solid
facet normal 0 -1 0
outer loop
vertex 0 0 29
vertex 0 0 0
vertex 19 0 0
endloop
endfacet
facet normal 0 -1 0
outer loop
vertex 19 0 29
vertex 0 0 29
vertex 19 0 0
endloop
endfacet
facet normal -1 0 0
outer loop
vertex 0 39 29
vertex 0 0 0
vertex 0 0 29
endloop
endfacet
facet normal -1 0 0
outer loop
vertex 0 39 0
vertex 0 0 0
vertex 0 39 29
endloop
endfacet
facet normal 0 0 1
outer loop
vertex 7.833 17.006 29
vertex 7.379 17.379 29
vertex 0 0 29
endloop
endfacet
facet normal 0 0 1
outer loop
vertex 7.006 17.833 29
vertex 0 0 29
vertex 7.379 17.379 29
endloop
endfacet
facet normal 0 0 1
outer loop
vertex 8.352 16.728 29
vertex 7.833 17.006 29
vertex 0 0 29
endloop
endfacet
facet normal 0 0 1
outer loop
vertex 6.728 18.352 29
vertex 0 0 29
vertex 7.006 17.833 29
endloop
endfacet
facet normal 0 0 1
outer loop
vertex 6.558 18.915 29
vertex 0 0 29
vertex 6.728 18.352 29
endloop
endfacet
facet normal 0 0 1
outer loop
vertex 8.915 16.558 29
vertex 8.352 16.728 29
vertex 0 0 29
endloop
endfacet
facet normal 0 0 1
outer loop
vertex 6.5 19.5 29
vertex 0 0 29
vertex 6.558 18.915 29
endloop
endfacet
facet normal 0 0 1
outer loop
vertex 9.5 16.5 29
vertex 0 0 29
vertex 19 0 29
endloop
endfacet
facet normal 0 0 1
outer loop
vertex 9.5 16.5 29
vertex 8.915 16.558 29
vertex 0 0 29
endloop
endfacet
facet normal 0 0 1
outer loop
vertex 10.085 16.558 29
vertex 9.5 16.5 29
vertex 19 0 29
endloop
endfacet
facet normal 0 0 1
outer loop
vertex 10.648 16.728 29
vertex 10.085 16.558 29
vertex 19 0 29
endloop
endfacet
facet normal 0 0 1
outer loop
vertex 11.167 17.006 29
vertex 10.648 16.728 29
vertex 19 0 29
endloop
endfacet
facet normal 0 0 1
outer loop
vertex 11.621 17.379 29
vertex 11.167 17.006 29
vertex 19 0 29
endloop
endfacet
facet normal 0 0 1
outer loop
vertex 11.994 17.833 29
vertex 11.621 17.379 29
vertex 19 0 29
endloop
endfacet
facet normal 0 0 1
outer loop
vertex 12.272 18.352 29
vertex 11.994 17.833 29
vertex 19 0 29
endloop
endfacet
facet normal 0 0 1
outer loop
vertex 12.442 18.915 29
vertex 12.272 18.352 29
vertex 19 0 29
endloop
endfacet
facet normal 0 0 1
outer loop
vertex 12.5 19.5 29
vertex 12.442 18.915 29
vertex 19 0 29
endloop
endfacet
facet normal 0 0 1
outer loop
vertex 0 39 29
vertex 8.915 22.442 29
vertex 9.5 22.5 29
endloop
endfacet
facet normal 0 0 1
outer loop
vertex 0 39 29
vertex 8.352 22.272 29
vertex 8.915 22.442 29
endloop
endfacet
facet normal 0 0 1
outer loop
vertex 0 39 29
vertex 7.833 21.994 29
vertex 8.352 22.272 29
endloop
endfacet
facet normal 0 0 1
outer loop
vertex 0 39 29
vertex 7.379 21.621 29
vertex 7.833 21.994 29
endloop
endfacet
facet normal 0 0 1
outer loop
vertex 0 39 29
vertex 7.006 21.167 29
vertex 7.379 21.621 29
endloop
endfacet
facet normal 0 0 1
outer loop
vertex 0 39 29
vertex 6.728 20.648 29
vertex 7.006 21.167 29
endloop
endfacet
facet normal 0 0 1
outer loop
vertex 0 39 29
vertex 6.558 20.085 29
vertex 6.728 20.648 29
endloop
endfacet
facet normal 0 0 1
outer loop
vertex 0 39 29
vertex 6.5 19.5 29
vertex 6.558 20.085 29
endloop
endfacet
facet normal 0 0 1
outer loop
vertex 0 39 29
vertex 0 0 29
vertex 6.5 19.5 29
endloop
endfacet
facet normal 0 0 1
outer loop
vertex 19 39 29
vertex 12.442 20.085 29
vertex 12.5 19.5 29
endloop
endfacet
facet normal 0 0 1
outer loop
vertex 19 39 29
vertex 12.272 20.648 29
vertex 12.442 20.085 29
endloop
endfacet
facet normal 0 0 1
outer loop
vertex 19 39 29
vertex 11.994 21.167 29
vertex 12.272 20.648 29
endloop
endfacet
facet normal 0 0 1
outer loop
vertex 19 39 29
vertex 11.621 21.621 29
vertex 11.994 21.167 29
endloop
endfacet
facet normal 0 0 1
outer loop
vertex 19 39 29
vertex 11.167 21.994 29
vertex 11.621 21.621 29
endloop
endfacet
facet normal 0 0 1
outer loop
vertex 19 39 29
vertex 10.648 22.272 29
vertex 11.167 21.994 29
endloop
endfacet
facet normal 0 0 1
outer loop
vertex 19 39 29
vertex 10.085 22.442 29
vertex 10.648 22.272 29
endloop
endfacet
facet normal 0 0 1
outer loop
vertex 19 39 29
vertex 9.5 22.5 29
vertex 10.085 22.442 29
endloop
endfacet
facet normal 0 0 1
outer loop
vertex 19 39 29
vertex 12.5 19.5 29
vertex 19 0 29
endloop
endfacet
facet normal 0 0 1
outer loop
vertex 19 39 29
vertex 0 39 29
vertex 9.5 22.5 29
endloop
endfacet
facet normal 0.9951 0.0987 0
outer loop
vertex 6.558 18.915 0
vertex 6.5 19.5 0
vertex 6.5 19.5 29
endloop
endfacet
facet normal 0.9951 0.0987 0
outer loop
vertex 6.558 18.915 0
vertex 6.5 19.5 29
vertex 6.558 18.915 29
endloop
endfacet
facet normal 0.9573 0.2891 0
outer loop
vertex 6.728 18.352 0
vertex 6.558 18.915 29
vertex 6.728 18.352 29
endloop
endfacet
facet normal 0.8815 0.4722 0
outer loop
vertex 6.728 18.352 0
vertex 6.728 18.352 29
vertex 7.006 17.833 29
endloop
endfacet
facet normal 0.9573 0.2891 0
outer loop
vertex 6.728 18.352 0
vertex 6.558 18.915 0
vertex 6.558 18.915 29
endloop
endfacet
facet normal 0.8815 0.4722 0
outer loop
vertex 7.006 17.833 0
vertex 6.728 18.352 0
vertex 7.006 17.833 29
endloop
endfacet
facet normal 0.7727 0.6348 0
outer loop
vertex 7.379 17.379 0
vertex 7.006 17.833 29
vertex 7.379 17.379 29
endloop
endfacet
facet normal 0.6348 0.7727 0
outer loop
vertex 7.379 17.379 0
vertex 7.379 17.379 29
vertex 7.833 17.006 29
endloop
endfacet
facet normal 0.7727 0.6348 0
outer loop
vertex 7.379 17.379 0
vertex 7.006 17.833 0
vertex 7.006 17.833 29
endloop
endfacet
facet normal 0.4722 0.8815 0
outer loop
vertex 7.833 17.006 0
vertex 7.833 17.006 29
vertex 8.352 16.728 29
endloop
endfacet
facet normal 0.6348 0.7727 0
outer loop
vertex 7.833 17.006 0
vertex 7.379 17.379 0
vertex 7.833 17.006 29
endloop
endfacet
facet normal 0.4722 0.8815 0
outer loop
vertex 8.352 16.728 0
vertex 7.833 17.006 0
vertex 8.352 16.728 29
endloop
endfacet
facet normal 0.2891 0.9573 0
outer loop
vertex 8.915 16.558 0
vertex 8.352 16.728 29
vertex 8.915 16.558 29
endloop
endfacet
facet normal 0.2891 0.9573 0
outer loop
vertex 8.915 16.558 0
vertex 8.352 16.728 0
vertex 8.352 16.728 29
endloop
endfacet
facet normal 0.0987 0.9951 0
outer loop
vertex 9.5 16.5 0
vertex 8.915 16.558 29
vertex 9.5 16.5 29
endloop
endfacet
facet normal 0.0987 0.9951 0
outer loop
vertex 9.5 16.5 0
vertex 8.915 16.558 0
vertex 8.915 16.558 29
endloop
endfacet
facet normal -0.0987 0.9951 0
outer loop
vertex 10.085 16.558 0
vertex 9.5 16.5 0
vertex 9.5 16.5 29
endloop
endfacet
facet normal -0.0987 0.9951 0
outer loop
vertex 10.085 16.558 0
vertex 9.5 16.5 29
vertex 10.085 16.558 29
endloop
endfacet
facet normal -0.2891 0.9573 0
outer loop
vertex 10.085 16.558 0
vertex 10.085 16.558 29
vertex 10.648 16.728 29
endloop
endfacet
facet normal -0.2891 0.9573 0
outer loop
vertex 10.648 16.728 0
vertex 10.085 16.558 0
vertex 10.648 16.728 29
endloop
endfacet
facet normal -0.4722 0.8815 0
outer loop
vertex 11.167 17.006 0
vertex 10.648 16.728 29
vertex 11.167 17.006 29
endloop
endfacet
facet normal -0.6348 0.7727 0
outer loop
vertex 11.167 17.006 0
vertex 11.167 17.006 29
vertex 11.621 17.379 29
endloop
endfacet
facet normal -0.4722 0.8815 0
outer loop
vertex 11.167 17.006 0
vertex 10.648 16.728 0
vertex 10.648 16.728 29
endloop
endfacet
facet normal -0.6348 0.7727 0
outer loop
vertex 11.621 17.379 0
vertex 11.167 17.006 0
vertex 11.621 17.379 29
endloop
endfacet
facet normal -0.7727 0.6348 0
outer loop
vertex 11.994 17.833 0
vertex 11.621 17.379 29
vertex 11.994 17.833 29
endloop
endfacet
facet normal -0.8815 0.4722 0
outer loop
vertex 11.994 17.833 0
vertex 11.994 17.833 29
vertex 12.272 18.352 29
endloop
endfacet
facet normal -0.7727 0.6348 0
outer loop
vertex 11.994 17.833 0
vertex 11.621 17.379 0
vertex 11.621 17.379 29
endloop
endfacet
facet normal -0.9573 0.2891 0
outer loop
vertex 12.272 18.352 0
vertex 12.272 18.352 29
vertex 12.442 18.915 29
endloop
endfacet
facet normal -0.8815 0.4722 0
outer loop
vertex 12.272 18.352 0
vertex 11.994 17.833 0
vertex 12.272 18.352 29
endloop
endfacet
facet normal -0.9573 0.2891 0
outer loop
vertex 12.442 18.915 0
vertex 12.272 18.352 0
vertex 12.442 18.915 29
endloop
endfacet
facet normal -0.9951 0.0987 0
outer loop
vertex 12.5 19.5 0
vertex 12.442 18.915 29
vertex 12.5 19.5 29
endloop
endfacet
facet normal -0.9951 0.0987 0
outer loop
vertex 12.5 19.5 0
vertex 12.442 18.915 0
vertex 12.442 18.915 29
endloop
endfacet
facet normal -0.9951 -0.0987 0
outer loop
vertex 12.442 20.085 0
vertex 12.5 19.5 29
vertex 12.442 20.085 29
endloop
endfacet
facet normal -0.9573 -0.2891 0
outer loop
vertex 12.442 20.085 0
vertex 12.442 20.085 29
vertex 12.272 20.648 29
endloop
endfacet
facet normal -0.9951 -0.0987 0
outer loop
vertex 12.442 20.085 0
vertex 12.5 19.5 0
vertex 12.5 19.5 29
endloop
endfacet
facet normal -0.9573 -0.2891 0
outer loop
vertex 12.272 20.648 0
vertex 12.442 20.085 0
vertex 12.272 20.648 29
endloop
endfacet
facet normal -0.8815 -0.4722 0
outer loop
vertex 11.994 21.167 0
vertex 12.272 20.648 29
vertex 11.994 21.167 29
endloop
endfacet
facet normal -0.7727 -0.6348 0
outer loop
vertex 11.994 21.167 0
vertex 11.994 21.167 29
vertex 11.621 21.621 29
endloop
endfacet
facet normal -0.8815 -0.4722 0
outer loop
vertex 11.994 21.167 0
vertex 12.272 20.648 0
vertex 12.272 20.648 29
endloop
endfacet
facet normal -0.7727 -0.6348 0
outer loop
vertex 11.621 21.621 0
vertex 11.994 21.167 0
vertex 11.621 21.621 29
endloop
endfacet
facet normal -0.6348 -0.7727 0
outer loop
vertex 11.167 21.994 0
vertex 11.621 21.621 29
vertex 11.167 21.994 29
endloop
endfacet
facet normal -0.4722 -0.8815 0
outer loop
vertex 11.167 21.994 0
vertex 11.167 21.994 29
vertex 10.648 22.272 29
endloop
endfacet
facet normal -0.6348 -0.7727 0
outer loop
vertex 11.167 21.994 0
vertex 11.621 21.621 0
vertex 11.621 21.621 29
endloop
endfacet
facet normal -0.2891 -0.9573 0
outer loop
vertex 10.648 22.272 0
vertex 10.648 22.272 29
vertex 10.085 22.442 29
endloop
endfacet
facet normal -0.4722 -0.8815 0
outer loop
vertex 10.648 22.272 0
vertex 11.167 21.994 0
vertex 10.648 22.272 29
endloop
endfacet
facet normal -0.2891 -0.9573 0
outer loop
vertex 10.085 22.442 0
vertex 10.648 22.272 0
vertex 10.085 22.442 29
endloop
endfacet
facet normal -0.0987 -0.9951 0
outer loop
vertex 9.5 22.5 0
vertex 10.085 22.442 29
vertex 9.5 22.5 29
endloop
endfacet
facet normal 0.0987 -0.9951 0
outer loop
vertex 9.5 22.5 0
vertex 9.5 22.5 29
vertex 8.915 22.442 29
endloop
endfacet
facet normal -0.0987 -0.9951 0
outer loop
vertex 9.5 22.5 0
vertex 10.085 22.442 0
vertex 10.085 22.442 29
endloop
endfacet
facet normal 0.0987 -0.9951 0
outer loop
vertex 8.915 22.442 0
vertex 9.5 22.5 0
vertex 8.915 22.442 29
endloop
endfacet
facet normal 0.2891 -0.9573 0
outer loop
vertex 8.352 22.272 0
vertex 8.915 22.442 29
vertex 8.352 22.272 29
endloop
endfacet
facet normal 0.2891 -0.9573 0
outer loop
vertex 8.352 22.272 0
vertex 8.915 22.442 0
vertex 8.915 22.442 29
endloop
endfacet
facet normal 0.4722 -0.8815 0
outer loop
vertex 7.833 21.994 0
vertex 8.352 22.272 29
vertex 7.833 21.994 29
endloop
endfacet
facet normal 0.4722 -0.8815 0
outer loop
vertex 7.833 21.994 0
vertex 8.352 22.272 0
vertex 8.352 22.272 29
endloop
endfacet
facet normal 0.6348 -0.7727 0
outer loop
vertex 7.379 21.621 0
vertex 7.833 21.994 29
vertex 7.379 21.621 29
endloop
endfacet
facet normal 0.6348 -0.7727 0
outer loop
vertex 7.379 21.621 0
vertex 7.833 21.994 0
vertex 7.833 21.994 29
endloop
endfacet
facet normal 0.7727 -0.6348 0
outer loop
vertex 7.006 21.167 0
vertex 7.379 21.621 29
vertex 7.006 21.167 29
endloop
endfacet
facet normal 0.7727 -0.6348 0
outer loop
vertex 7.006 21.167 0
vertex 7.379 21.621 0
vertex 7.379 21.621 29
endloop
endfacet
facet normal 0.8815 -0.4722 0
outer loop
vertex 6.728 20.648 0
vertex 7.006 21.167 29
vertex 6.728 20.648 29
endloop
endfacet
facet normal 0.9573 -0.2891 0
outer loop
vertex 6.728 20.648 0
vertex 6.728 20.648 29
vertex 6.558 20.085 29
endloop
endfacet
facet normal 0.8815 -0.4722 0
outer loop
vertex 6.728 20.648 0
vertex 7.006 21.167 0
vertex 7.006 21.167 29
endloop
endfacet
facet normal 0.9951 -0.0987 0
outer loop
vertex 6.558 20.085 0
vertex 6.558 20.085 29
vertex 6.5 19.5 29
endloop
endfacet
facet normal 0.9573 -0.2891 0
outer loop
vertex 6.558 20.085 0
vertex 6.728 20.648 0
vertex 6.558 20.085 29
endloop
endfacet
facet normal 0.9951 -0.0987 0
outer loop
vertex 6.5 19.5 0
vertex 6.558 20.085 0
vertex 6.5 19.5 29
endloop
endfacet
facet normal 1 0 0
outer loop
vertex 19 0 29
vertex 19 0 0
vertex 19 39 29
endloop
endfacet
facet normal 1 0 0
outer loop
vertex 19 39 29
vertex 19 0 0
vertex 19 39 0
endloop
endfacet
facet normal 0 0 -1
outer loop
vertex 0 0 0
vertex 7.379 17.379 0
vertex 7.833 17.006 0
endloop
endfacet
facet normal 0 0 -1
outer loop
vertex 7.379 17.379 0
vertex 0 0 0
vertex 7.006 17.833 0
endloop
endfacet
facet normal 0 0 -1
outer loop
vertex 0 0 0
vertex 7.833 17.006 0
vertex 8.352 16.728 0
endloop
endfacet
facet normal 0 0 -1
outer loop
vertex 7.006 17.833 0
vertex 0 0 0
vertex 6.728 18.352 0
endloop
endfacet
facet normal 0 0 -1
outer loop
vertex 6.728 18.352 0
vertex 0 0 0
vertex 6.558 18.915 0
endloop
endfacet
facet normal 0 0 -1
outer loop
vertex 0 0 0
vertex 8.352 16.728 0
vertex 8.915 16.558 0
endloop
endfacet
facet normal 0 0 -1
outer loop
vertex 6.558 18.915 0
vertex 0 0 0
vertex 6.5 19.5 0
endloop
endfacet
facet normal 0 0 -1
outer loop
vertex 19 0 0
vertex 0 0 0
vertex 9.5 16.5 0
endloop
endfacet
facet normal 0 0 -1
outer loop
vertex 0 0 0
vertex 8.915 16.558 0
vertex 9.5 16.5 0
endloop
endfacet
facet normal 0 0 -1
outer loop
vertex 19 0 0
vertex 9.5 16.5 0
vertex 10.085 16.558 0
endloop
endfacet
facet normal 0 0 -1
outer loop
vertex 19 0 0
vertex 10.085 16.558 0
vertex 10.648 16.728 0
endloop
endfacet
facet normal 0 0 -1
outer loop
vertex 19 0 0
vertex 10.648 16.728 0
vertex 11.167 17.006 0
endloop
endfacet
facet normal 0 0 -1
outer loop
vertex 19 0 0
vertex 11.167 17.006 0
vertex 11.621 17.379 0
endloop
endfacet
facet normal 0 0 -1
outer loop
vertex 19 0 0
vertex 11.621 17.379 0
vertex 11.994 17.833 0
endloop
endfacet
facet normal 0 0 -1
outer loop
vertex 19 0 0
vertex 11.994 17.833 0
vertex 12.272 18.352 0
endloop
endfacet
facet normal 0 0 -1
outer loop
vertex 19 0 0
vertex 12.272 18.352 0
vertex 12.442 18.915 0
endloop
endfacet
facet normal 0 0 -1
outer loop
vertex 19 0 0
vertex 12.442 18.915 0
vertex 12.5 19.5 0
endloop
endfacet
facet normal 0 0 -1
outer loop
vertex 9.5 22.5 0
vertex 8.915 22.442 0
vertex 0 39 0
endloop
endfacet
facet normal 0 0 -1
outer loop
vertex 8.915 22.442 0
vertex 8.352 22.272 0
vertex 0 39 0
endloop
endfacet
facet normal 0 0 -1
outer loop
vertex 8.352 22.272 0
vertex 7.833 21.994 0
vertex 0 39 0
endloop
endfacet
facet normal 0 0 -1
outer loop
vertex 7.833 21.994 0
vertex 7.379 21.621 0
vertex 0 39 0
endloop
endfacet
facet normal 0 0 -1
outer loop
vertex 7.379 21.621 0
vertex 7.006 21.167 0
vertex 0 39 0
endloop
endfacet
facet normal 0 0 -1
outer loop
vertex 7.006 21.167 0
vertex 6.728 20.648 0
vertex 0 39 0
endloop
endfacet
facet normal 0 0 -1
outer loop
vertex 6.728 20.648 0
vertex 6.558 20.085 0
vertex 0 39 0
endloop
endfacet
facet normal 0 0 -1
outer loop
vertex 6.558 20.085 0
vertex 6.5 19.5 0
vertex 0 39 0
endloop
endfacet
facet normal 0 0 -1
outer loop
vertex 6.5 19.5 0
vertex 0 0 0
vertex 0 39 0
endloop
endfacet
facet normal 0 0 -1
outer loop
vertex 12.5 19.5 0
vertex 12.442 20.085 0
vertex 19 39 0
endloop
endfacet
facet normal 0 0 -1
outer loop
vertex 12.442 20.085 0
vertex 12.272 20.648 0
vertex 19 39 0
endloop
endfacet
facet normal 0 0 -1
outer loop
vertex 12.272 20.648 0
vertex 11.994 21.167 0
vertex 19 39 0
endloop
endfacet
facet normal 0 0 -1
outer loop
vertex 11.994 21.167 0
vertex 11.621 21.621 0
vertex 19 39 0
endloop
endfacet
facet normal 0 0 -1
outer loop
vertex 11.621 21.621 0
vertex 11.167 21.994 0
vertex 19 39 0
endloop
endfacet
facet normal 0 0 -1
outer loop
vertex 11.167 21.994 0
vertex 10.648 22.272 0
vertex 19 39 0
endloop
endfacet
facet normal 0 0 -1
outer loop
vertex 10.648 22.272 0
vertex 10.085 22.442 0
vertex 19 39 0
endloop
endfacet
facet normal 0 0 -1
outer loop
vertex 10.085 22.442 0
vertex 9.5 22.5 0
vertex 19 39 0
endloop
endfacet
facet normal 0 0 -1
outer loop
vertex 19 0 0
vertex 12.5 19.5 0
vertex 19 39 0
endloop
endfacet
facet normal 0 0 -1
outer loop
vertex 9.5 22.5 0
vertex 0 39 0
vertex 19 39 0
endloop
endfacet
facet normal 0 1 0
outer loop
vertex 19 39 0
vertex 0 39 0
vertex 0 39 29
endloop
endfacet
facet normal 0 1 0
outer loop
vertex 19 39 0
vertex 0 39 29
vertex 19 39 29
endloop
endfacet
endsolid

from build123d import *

# Parameters (mm, degrees)
ESQUISSE1_W        = 19
ESQUISSE1_H        = 39
ESQUISSE1_R        = 3
BOSS_EXTRU_1_DEPTH = 29


with BuildPart() as part:
    # Esquisse1 → Boss.-Extru.1 (new body)
    with BuildSketch(Plane.XY):
        with Locations((9.5, 19.5)):
            Rectangle(ESQUISSE1_W, ESQUISSE1_H)
        with Locations(Location((9.5, 19.5, 0), (0, 0, 180))):
            Circle(ESQUISSE1_R, mode=Mode.SUBTRACT)
    extrude(amount=BOSS_EXTRU_1_DEPTH)


solid = part.part
